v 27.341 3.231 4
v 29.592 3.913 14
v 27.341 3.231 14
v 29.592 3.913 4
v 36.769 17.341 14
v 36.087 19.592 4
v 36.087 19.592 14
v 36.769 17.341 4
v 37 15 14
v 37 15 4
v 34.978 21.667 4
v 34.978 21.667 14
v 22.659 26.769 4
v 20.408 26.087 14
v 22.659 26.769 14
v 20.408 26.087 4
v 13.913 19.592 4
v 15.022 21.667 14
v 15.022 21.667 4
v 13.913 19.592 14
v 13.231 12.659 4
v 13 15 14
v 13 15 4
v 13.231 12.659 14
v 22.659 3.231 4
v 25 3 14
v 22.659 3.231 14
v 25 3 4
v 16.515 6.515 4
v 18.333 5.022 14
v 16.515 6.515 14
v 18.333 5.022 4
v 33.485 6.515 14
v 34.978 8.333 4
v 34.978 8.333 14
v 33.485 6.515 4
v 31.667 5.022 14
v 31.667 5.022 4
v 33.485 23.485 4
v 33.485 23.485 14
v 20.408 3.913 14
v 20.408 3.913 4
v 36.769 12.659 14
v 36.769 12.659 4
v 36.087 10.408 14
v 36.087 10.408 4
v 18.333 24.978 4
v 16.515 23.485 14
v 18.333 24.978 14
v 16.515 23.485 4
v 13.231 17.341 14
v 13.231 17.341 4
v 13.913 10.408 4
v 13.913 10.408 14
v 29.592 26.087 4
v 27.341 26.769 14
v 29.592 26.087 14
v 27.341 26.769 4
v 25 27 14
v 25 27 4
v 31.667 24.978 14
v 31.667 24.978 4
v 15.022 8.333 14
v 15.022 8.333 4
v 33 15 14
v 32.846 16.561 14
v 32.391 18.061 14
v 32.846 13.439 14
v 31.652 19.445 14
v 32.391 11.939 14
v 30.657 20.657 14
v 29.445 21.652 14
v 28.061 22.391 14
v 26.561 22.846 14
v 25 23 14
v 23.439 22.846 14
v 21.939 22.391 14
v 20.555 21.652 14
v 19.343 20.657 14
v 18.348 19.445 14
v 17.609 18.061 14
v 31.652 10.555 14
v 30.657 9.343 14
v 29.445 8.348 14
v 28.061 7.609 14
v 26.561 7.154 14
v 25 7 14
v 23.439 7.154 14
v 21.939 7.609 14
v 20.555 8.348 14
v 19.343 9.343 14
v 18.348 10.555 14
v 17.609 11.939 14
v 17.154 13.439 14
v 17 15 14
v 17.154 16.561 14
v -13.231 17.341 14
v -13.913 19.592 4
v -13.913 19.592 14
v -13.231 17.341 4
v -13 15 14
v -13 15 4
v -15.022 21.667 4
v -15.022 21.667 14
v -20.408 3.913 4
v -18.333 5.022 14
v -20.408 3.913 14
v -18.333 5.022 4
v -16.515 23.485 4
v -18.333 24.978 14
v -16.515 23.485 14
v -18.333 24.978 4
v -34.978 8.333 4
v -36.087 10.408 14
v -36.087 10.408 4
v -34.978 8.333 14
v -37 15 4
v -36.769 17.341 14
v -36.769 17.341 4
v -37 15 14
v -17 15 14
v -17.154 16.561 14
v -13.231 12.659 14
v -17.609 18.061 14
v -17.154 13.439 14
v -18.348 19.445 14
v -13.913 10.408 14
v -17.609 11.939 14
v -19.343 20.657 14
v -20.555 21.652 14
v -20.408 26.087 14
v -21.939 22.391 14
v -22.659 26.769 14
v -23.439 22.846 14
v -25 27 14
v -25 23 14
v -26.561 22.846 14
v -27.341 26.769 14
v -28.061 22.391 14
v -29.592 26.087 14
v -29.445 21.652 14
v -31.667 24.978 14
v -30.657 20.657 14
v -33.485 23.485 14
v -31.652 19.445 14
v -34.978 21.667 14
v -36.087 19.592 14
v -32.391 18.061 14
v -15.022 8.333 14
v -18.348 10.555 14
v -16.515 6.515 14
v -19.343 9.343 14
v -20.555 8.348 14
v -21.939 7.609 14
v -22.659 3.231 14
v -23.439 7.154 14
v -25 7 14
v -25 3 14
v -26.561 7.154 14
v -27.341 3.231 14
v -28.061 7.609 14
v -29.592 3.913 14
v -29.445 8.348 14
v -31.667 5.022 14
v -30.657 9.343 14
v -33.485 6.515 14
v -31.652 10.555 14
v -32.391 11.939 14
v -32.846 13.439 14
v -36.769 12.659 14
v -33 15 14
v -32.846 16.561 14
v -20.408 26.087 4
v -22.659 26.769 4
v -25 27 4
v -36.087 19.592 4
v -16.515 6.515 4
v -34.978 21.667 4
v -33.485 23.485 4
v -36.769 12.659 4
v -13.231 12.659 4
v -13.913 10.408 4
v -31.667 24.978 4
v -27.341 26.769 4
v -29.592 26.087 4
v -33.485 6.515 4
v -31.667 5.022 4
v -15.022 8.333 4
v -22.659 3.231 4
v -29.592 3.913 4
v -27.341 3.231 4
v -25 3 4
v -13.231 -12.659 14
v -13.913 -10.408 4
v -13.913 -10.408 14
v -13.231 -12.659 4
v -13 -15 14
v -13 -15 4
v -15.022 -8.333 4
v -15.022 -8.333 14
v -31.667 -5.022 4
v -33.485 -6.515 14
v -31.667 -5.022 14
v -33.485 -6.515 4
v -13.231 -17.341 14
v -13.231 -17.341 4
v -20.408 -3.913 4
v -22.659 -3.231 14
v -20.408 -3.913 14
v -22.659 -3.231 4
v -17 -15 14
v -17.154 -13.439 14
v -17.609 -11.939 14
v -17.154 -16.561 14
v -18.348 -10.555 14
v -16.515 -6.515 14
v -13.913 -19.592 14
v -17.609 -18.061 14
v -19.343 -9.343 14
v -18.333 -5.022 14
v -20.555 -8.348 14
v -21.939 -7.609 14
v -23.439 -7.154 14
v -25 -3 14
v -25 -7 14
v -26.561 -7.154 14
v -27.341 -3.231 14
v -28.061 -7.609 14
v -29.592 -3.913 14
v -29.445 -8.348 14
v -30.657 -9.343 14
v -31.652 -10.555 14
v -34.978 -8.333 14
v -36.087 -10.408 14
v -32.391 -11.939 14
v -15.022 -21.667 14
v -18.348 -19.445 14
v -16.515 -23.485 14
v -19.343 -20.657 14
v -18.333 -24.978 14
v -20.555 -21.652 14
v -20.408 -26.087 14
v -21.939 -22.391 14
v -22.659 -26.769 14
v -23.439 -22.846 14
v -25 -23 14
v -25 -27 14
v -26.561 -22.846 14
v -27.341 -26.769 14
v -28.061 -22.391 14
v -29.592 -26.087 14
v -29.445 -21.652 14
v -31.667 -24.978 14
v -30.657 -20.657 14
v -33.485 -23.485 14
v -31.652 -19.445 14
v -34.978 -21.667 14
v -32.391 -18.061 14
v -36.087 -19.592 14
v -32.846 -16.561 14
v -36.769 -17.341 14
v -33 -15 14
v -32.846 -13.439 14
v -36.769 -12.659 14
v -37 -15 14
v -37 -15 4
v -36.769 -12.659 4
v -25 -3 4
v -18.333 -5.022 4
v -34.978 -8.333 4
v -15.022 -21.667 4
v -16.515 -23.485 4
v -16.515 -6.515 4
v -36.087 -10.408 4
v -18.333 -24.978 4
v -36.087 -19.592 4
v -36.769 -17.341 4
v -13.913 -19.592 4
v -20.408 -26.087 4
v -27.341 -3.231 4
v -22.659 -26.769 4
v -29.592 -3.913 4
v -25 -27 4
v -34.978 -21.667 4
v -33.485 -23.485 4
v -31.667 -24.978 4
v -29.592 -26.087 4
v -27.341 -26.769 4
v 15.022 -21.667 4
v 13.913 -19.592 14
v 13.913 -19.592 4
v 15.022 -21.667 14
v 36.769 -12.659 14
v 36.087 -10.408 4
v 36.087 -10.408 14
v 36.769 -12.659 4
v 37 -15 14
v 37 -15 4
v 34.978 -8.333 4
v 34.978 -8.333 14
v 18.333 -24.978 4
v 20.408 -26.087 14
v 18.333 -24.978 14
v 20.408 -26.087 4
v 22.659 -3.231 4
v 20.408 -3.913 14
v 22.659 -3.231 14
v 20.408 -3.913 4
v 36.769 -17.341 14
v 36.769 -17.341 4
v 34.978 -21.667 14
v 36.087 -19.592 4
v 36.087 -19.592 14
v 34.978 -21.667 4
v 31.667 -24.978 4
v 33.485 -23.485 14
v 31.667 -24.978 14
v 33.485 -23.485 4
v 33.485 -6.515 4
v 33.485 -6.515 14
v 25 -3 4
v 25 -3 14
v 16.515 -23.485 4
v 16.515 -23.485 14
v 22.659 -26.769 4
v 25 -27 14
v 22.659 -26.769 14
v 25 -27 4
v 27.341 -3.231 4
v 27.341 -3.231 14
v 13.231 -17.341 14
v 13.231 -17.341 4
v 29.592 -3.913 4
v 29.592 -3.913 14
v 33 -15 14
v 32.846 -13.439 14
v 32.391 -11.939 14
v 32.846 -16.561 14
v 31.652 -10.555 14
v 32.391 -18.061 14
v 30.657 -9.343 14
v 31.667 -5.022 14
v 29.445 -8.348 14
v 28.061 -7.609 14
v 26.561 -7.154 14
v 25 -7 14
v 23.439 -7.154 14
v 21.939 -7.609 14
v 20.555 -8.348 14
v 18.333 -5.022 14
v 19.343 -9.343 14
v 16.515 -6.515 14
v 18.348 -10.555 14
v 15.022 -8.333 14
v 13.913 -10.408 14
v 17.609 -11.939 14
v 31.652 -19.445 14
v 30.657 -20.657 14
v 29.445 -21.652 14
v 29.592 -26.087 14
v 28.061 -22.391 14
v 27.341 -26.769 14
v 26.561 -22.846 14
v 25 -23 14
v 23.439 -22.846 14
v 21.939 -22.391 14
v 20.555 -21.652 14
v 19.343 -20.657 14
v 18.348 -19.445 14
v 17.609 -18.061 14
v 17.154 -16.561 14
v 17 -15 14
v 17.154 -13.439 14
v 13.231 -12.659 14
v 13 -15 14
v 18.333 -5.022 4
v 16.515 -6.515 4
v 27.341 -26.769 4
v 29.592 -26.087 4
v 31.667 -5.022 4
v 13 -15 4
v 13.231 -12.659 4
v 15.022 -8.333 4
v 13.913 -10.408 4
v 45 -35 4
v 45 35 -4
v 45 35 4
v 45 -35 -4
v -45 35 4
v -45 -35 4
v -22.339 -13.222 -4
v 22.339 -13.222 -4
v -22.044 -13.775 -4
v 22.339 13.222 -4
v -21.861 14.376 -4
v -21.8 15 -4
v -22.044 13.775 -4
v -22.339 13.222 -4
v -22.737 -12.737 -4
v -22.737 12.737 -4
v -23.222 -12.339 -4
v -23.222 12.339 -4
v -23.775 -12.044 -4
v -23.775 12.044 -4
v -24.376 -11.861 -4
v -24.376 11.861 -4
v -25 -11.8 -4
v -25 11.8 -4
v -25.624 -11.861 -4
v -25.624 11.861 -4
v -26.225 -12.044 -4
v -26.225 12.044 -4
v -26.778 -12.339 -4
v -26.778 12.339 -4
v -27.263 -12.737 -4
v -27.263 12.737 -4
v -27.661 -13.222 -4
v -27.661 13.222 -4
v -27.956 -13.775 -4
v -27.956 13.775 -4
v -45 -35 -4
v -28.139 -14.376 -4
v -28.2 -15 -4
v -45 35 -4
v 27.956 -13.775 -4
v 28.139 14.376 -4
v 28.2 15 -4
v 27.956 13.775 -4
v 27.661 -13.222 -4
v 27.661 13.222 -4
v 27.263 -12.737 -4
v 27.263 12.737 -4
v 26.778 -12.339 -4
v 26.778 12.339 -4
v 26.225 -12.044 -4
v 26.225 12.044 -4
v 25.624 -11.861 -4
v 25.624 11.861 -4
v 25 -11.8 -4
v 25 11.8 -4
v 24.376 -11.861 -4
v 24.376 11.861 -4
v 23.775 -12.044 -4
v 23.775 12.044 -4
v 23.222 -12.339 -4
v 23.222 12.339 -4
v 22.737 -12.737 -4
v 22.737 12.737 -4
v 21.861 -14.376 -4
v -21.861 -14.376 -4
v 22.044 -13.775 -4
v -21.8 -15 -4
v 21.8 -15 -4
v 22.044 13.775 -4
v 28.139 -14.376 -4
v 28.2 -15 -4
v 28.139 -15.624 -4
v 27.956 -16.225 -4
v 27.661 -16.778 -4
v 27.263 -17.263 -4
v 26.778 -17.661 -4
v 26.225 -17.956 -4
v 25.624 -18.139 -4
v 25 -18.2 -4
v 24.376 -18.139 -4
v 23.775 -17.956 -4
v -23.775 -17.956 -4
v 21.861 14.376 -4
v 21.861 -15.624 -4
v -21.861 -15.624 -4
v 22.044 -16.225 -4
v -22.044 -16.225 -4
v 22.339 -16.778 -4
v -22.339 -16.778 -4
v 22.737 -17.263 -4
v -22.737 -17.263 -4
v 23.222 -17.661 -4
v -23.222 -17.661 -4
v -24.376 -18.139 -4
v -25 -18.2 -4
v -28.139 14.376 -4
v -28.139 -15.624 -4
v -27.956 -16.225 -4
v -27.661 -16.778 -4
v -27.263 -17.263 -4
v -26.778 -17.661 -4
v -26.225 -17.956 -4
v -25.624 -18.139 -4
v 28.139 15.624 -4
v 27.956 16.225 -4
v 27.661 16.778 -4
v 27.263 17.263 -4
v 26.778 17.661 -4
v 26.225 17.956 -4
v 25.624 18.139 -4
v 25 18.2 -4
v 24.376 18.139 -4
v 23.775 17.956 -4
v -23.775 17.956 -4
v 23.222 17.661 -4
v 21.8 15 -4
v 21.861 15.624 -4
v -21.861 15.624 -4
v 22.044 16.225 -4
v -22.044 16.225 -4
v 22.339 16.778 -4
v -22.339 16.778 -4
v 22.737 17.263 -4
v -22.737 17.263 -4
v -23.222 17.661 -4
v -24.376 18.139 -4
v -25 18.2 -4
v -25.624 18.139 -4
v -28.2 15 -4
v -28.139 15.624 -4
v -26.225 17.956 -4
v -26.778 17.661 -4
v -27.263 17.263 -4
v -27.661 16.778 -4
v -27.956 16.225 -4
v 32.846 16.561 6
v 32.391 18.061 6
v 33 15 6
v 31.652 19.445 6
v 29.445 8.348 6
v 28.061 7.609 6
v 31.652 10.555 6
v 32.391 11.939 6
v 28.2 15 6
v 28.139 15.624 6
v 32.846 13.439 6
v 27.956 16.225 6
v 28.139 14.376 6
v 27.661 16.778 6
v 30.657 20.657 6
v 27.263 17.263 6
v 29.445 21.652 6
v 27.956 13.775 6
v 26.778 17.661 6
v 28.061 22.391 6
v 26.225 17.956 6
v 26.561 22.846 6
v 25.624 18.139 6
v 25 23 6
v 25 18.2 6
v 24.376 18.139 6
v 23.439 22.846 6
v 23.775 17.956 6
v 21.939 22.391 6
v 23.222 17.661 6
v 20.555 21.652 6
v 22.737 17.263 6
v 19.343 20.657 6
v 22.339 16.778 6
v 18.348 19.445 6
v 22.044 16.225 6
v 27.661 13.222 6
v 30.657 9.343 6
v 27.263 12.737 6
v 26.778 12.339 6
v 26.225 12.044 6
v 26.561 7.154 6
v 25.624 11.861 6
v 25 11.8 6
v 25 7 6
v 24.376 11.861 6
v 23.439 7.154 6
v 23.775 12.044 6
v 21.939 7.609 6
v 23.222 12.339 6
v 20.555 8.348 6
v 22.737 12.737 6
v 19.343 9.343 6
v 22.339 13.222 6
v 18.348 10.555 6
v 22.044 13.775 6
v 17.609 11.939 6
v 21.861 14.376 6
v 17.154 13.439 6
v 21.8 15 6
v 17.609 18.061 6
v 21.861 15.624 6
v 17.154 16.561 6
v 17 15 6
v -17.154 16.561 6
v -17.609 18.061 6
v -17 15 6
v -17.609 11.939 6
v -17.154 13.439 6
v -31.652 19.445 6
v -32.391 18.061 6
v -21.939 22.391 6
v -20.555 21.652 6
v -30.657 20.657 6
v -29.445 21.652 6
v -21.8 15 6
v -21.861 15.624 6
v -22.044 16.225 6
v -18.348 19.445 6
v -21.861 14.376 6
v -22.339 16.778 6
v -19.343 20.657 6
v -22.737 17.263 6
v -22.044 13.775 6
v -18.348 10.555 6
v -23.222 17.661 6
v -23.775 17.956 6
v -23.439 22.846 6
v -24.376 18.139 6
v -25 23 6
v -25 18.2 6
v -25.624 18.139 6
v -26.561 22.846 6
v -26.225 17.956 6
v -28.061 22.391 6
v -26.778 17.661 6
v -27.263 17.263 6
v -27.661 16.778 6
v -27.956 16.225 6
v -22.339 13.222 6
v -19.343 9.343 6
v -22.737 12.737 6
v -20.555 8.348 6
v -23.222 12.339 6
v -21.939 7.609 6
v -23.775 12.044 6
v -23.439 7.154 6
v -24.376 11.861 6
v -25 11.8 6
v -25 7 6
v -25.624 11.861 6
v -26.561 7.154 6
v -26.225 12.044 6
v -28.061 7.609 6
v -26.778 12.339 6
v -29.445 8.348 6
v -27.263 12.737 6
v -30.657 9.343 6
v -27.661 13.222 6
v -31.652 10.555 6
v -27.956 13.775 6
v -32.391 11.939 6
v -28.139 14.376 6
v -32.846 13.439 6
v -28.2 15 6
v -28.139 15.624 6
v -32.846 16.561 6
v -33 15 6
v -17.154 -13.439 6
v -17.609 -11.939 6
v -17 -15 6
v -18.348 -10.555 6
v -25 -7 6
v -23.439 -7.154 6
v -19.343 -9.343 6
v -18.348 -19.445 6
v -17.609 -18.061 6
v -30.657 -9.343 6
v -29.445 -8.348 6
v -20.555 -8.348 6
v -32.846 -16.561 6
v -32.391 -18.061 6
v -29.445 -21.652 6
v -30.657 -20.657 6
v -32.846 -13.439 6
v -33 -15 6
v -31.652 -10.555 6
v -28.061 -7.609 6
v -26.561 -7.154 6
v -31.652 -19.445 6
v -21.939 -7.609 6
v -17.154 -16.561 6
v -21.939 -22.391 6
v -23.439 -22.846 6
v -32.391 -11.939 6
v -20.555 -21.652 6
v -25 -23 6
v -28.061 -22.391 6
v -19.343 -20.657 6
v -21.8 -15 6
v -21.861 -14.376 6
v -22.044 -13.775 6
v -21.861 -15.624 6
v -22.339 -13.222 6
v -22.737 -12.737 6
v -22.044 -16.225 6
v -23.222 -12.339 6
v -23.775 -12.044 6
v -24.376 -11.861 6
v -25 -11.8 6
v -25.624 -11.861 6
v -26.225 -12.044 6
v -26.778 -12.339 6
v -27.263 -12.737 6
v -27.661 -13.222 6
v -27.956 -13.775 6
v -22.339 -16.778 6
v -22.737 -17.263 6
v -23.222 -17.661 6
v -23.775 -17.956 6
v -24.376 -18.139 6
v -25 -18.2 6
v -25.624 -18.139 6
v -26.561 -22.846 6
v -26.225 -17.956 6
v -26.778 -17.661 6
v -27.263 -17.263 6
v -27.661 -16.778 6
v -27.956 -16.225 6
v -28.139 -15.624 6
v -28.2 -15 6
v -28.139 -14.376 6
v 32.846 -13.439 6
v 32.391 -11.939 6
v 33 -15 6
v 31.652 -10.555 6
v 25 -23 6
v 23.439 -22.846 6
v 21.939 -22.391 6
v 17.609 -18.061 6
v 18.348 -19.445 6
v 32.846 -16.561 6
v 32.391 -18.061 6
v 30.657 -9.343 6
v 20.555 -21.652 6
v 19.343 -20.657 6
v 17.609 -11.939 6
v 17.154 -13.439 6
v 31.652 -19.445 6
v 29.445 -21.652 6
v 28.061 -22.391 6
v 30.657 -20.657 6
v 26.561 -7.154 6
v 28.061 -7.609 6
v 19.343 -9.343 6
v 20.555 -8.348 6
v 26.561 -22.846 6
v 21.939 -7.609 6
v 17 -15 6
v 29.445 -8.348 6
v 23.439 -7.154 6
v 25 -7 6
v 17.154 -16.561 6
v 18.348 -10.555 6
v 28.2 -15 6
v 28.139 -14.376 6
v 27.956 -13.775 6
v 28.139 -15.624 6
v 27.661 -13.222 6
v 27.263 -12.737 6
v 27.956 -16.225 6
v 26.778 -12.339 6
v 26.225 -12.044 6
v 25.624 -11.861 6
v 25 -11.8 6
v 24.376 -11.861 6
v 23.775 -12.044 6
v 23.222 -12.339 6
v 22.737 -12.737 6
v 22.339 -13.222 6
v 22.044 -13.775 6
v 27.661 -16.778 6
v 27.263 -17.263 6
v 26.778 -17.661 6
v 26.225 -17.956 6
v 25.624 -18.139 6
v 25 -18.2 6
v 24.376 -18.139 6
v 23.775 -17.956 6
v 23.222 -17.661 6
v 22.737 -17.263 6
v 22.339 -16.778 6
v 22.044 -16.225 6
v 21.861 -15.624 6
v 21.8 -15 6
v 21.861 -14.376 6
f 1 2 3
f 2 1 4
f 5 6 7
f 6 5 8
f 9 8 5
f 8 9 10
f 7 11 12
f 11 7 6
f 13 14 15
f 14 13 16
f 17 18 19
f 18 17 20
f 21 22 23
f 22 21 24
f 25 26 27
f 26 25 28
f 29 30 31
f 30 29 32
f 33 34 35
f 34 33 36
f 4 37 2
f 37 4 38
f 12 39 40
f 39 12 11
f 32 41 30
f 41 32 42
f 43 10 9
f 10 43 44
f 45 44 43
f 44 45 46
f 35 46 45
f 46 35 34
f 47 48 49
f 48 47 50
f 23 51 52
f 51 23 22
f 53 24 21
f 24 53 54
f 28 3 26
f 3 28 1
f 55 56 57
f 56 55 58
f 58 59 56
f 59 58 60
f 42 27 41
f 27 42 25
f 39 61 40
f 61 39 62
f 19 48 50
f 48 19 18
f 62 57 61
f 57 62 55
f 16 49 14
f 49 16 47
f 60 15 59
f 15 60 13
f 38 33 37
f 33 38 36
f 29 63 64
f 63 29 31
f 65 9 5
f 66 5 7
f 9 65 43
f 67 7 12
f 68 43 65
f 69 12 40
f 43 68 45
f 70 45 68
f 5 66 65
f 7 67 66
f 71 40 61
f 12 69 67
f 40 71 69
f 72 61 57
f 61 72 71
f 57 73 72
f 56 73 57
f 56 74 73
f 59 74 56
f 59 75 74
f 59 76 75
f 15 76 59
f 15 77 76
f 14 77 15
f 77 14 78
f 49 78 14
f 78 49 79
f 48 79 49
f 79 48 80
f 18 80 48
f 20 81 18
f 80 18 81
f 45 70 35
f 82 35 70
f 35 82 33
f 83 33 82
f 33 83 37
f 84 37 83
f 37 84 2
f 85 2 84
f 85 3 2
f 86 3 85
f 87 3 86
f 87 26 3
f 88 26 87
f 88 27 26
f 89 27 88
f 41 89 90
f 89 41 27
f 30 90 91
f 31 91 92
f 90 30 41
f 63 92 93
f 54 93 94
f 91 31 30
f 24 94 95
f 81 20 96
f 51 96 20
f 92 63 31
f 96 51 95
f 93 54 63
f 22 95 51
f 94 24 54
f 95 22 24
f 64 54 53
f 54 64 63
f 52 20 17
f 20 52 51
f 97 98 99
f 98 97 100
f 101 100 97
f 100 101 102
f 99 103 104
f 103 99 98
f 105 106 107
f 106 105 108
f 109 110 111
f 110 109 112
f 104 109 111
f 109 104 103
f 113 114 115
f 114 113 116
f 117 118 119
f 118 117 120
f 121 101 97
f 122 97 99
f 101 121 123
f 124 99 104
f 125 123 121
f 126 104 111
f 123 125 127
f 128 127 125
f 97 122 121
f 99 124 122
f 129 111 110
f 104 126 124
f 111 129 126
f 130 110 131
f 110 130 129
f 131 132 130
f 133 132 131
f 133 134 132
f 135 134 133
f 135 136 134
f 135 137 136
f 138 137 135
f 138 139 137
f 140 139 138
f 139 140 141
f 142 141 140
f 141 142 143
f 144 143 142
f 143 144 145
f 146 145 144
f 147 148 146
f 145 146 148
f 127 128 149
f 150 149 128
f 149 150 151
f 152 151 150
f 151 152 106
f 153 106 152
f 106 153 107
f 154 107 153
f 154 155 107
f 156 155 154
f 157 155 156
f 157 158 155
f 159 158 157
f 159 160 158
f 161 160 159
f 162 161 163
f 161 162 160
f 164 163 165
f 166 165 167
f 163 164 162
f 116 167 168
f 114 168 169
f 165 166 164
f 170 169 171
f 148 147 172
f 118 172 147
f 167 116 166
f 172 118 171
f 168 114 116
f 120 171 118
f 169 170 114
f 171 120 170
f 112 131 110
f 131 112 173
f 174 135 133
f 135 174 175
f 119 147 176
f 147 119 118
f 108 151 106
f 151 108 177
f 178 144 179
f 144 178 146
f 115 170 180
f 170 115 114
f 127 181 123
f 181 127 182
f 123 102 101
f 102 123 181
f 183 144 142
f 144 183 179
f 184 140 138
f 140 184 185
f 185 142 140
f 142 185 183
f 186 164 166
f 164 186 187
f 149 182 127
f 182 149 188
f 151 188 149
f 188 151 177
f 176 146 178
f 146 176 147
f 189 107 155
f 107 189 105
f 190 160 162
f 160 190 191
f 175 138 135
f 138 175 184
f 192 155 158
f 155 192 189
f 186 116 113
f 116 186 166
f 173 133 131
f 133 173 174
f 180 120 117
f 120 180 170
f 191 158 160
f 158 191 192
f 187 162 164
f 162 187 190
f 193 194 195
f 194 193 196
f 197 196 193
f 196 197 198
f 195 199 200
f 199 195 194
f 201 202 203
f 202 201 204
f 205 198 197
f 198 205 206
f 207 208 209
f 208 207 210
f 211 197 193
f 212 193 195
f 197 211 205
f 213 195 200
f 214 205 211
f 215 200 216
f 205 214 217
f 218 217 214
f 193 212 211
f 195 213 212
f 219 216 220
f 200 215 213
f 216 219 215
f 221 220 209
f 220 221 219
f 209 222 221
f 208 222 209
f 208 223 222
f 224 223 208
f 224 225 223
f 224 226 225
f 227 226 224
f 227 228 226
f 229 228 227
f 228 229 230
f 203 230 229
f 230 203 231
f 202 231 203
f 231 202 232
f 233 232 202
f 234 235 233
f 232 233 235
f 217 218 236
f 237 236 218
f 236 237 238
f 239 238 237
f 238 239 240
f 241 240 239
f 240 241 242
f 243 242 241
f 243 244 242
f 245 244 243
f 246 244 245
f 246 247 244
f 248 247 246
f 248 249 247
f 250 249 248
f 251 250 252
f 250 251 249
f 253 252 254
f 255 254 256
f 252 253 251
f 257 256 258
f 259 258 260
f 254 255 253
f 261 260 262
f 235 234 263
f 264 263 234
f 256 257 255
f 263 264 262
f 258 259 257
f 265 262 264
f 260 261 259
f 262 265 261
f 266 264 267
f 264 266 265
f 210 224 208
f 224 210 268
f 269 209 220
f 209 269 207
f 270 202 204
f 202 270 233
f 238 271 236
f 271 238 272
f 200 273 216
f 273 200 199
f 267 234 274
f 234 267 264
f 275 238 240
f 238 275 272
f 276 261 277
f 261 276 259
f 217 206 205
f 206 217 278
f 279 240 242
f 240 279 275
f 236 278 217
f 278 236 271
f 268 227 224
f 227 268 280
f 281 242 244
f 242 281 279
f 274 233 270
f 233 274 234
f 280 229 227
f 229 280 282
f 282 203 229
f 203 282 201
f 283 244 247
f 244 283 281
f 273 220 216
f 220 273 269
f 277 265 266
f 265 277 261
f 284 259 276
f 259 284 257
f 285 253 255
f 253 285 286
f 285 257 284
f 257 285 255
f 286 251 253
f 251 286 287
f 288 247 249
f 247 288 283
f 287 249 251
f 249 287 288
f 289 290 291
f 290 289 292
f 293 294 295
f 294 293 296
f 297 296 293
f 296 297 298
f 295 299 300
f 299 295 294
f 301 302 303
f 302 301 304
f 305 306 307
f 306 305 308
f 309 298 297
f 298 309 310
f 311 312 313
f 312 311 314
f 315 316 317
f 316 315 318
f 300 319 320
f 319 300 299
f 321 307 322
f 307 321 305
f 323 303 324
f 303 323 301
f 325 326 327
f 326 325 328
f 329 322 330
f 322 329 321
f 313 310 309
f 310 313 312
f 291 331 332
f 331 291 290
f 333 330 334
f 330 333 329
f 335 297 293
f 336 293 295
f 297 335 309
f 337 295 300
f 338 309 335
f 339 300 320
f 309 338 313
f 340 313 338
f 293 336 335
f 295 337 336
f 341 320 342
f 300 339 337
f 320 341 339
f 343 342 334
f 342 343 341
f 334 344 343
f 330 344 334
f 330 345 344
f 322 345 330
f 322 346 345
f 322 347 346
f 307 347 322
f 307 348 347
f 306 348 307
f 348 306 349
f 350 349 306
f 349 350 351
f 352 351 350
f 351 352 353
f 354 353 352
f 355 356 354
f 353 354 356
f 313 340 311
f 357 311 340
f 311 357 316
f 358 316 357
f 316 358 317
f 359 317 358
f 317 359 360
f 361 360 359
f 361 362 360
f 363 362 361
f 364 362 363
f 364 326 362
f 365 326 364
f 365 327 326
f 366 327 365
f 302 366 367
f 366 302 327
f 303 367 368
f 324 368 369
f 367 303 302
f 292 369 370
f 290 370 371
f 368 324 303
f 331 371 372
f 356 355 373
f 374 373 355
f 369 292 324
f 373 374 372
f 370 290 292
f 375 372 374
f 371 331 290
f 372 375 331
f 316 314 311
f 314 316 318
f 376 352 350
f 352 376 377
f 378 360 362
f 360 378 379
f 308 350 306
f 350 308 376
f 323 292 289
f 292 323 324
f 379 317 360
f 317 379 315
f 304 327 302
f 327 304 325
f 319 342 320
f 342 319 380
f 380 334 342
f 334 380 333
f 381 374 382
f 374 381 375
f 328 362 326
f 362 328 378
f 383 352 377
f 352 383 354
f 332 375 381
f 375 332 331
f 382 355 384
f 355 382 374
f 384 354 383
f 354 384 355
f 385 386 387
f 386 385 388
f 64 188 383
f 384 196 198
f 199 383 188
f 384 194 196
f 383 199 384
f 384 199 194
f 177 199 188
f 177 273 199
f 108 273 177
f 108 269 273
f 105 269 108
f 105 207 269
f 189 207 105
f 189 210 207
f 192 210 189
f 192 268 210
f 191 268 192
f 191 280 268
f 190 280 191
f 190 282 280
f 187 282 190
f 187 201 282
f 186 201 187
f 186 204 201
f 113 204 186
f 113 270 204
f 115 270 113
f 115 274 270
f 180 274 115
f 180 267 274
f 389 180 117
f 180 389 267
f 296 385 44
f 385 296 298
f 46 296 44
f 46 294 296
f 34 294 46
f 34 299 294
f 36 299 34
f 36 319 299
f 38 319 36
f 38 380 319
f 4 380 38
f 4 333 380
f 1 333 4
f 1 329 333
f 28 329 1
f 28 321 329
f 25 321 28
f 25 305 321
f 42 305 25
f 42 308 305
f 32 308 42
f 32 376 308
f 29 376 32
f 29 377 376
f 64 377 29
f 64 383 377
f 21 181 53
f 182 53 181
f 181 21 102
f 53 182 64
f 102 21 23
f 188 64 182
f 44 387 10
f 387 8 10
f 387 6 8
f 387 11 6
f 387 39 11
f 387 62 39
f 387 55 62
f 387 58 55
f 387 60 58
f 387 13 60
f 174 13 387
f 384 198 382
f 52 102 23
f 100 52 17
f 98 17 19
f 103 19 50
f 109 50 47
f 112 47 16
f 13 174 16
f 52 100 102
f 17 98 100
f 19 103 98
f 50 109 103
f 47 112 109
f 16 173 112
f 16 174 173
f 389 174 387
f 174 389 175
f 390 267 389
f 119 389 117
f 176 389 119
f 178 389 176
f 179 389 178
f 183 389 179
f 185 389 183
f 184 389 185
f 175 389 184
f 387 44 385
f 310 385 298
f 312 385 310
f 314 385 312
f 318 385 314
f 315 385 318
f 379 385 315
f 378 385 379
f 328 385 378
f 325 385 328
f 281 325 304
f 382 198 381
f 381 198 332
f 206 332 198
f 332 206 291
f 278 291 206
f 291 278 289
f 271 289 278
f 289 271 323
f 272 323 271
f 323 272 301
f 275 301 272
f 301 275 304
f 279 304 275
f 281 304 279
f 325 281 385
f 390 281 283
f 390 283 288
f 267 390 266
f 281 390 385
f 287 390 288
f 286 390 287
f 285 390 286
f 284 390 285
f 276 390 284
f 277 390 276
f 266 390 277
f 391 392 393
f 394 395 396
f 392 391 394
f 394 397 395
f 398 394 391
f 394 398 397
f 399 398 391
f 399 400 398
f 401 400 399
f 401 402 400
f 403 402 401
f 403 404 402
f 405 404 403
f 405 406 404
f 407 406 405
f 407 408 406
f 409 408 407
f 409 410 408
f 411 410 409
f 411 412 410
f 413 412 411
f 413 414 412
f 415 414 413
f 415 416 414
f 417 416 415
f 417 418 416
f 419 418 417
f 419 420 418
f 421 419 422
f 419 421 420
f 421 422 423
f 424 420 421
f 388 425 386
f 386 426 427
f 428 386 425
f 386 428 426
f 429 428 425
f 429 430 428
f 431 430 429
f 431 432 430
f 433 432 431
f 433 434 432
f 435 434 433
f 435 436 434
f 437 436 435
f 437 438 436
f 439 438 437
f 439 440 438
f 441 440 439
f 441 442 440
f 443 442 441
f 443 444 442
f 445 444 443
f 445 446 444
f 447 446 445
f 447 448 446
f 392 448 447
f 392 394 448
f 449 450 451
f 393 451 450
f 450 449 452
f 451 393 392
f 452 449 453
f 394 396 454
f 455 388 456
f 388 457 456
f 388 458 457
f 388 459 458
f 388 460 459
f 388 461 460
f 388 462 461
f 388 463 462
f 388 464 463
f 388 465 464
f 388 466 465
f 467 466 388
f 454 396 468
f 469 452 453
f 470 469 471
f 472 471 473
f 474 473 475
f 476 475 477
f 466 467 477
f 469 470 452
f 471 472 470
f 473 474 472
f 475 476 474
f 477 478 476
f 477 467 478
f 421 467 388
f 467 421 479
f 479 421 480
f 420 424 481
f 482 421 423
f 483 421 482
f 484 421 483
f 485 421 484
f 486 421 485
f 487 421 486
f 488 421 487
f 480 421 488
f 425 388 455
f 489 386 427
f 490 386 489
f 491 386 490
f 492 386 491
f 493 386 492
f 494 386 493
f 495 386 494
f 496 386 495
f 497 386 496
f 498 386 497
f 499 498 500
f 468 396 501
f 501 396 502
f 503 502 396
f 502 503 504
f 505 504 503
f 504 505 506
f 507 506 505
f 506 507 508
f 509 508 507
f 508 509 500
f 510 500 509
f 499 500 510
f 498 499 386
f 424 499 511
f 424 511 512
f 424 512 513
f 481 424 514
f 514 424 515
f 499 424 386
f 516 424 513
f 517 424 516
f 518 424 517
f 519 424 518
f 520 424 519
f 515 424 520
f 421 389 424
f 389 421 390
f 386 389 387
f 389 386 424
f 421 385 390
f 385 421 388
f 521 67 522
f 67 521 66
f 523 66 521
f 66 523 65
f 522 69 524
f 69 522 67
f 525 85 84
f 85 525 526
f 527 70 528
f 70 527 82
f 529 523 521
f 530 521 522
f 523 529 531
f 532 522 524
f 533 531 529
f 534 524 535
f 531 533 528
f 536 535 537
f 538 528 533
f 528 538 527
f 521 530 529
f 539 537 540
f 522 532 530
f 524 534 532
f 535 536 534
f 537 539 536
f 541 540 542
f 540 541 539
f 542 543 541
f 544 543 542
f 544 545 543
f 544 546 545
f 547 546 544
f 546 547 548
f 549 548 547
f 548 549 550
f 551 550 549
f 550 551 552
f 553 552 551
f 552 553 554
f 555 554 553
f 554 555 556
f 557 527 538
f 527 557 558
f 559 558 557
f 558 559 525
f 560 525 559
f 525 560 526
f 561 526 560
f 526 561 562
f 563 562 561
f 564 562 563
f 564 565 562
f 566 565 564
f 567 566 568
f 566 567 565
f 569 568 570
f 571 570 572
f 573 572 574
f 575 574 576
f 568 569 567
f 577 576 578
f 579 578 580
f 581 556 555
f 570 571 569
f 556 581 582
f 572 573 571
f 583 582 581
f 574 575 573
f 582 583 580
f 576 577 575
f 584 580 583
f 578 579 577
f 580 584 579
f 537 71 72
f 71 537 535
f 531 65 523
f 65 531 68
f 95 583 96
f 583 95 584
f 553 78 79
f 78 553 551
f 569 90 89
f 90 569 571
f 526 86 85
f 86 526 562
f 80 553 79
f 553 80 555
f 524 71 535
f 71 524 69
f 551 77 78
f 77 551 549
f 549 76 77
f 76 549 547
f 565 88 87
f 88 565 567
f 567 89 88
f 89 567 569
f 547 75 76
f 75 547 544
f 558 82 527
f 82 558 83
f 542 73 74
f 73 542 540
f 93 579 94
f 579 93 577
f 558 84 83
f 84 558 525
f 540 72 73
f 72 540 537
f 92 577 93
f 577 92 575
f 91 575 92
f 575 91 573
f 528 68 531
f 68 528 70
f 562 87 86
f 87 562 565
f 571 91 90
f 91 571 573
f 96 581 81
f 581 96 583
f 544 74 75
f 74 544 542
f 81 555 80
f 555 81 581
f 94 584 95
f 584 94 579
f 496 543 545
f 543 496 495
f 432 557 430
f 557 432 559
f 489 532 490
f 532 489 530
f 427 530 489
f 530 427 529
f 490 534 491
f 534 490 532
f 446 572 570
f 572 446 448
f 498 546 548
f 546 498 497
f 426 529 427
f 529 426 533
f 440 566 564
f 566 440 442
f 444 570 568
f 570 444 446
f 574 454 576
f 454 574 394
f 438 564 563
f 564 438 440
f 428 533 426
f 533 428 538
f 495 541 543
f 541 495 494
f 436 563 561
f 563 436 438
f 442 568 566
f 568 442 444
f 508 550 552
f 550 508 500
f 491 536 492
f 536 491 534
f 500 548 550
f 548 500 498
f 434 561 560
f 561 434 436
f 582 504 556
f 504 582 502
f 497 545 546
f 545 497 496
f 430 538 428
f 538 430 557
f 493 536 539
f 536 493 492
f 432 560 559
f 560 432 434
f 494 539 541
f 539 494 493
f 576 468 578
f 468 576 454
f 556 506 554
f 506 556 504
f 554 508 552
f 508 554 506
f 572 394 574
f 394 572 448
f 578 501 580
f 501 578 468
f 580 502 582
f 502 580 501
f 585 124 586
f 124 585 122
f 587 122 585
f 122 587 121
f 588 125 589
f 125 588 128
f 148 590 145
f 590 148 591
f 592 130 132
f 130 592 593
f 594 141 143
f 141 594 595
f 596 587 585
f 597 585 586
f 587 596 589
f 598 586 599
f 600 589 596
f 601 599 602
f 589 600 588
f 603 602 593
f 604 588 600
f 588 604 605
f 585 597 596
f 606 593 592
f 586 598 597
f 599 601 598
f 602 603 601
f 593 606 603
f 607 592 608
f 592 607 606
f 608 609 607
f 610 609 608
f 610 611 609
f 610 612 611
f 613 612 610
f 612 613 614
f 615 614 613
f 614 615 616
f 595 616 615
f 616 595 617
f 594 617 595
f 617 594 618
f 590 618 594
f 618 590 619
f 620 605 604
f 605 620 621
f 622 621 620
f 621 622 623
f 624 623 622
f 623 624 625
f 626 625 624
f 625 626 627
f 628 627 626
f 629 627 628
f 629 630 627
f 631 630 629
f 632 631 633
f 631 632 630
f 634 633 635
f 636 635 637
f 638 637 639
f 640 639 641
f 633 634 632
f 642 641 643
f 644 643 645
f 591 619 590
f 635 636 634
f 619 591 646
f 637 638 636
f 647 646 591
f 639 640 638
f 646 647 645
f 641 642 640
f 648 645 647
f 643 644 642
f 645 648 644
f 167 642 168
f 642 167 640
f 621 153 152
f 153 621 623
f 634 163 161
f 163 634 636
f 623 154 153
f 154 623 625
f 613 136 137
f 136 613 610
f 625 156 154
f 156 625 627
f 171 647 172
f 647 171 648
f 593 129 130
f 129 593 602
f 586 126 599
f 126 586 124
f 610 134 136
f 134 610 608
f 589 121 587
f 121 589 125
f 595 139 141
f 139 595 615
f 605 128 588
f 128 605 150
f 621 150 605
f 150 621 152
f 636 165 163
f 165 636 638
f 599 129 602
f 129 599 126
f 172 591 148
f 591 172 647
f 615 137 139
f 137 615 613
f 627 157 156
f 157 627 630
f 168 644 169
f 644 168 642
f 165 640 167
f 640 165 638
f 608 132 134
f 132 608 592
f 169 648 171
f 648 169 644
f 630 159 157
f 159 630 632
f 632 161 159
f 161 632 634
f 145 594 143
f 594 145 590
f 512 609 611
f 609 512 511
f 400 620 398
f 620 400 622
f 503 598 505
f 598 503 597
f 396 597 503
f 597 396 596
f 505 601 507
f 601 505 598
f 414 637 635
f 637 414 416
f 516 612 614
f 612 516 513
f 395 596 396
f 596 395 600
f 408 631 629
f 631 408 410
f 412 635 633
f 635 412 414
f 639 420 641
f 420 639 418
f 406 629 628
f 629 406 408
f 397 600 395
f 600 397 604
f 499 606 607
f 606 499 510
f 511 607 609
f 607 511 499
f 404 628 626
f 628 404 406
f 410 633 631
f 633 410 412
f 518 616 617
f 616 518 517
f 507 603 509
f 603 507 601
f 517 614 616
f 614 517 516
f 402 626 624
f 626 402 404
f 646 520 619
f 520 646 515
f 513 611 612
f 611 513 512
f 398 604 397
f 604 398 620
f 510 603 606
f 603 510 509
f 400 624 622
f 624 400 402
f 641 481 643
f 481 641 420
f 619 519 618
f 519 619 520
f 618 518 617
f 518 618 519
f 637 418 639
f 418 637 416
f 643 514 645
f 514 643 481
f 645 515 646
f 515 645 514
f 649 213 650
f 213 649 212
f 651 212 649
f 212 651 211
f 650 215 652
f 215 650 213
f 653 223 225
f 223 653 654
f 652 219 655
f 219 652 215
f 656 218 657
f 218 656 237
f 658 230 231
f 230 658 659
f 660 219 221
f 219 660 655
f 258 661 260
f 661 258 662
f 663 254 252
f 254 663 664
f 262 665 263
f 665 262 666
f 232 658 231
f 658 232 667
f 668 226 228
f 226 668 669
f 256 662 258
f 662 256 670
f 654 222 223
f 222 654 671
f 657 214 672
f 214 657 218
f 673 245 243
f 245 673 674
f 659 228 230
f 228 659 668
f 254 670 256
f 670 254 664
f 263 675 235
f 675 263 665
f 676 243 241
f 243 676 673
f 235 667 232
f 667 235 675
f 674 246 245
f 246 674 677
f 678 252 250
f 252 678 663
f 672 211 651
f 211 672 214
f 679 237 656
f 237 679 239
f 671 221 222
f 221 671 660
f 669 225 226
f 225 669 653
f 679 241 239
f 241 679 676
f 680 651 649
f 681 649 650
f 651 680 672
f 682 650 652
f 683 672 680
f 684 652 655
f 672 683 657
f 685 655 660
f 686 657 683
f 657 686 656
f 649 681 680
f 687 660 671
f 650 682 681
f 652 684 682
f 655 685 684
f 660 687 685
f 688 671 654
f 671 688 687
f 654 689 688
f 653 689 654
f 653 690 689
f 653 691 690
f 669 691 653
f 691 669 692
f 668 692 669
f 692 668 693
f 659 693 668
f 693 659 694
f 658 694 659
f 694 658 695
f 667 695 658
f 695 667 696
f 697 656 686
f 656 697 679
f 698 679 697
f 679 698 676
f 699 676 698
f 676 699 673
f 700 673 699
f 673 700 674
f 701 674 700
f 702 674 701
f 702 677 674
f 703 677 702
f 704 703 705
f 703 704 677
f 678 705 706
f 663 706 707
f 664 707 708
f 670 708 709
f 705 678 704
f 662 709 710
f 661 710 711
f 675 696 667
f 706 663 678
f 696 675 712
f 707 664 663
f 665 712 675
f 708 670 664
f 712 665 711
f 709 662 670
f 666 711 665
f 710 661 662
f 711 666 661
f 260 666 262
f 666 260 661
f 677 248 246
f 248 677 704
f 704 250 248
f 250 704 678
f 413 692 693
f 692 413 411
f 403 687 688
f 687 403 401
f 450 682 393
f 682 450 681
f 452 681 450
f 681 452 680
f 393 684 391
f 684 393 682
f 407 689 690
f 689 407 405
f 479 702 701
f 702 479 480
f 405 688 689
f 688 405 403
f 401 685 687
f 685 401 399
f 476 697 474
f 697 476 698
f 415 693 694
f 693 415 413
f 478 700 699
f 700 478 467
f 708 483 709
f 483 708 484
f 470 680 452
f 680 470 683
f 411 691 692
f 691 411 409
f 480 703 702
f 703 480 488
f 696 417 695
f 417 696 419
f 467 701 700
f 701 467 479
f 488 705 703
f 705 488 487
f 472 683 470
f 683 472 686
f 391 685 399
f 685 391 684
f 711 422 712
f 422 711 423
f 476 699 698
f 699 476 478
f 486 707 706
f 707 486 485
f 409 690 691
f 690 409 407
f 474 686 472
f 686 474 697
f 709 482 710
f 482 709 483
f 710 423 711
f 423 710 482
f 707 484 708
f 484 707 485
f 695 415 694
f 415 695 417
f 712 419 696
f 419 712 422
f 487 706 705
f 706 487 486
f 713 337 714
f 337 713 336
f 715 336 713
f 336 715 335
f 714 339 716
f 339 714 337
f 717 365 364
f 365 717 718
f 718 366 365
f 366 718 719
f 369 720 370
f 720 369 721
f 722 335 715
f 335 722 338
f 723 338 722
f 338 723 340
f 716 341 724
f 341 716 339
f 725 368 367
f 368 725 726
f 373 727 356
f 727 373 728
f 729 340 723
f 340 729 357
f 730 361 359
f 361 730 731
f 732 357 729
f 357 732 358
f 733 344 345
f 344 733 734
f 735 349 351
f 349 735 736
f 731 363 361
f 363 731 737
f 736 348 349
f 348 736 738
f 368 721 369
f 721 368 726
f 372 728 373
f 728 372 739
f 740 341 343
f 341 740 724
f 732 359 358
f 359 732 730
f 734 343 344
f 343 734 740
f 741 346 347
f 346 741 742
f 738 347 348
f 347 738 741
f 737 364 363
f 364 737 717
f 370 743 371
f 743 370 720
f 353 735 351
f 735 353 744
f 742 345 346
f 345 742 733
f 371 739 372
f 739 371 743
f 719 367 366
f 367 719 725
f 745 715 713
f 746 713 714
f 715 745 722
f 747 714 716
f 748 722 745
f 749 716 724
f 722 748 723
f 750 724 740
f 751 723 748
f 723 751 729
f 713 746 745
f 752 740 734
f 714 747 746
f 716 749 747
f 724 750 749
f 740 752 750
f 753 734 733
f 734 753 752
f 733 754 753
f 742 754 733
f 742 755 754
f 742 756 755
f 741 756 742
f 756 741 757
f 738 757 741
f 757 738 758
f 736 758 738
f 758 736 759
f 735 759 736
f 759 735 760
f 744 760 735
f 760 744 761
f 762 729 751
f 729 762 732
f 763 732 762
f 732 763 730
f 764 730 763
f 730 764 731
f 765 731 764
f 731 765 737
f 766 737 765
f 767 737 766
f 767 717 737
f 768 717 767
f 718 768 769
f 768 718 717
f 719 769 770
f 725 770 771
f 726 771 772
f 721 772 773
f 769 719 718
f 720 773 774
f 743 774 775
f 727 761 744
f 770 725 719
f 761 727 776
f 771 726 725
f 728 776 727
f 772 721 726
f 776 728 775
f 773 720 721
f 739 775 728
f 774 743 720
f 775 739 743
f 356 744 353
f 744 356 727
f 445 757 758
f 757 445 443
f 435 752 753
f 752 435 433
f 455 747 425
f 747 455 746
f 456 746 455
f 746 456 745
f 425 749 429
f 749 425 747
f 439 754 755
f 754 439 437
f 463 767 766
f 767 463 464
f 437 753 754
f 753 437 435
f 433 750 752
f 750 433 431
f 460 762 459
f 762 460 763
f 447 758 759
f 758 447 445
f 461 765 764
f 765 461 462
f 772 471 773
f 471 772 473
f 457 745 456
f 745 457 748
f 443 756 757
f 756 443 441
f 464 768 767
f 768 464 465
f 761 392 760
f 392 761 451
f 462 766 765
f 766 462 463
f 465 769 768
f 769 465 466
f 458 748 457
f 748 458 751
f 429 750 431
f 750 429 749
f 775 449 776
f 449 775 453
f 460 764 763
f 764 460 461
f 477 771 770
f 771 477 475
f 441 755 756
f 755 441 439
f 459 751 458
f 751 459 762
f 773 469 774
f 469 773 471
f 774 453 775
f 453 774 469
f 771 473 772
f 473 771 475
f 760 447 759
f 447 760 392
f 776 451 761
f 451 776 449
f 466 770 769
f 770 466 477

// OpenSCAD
$fn = 32;

// ----------------------------------------------------------------------
// Socket pad plate
// bosses with counterbored sockets for the screws
// ----------------------------------------------------------------------

// --- parameters (mm) ---
base_t = 8;           // base plate thickness
boss_h = 10;          // boss height above the base plate
boss_d = 24;          // boss diameter
socket_d = 16;        // socket diameter
socket_depth = 8;     // socket depth from the boss face
bolt_d = 6.4;         // screw clearance hole through the socket floor
plate = [90, 70, 8];  // overall size (x, y, z)
edge = 20;            // boss centre offset from the plate edge
pads = 4;             // boss count, one per corner

// --- derived feature positions (mm) ---
height = base_t + boss_h;        // = 18   overall height of the part
corner_x = plate[0] / 2 - edge;  // = 25   boss centre X
corner_y = plate[1] / 2 - edge;  // = 15   boss centre Y
feature_centers = [
  [corner_x, corner_y],
  [-corner_x, corner_y],
  [-corner_x, -corner_y],
  [corner_x, -corner_y]
];   // boss centres: sockets, holes and the pads themselves are placed from here

// base plate, bosses on feature_centers, socket + through hole in each
difference() {
  union() {
    cube(plate, center = true);
    for (centre = feature_centers)
      translate([centre[0], centre[1], plate[2] / 2 - 1])
        cylinder(d = boss_d, h = boss_h + 1);
  }
  for (centre = feature_centers) {
    translate([centre[0], centre[1], plate[2] / 2 + boss_h - socket_depth])
      cylinder(d = socket_d, h = socket_depth + 1);
    translate([centre[0], centre[1], -height])
      cylinder(d = bolt_d, h = 2 * height + 2);  // through the socket floor
  }
}
